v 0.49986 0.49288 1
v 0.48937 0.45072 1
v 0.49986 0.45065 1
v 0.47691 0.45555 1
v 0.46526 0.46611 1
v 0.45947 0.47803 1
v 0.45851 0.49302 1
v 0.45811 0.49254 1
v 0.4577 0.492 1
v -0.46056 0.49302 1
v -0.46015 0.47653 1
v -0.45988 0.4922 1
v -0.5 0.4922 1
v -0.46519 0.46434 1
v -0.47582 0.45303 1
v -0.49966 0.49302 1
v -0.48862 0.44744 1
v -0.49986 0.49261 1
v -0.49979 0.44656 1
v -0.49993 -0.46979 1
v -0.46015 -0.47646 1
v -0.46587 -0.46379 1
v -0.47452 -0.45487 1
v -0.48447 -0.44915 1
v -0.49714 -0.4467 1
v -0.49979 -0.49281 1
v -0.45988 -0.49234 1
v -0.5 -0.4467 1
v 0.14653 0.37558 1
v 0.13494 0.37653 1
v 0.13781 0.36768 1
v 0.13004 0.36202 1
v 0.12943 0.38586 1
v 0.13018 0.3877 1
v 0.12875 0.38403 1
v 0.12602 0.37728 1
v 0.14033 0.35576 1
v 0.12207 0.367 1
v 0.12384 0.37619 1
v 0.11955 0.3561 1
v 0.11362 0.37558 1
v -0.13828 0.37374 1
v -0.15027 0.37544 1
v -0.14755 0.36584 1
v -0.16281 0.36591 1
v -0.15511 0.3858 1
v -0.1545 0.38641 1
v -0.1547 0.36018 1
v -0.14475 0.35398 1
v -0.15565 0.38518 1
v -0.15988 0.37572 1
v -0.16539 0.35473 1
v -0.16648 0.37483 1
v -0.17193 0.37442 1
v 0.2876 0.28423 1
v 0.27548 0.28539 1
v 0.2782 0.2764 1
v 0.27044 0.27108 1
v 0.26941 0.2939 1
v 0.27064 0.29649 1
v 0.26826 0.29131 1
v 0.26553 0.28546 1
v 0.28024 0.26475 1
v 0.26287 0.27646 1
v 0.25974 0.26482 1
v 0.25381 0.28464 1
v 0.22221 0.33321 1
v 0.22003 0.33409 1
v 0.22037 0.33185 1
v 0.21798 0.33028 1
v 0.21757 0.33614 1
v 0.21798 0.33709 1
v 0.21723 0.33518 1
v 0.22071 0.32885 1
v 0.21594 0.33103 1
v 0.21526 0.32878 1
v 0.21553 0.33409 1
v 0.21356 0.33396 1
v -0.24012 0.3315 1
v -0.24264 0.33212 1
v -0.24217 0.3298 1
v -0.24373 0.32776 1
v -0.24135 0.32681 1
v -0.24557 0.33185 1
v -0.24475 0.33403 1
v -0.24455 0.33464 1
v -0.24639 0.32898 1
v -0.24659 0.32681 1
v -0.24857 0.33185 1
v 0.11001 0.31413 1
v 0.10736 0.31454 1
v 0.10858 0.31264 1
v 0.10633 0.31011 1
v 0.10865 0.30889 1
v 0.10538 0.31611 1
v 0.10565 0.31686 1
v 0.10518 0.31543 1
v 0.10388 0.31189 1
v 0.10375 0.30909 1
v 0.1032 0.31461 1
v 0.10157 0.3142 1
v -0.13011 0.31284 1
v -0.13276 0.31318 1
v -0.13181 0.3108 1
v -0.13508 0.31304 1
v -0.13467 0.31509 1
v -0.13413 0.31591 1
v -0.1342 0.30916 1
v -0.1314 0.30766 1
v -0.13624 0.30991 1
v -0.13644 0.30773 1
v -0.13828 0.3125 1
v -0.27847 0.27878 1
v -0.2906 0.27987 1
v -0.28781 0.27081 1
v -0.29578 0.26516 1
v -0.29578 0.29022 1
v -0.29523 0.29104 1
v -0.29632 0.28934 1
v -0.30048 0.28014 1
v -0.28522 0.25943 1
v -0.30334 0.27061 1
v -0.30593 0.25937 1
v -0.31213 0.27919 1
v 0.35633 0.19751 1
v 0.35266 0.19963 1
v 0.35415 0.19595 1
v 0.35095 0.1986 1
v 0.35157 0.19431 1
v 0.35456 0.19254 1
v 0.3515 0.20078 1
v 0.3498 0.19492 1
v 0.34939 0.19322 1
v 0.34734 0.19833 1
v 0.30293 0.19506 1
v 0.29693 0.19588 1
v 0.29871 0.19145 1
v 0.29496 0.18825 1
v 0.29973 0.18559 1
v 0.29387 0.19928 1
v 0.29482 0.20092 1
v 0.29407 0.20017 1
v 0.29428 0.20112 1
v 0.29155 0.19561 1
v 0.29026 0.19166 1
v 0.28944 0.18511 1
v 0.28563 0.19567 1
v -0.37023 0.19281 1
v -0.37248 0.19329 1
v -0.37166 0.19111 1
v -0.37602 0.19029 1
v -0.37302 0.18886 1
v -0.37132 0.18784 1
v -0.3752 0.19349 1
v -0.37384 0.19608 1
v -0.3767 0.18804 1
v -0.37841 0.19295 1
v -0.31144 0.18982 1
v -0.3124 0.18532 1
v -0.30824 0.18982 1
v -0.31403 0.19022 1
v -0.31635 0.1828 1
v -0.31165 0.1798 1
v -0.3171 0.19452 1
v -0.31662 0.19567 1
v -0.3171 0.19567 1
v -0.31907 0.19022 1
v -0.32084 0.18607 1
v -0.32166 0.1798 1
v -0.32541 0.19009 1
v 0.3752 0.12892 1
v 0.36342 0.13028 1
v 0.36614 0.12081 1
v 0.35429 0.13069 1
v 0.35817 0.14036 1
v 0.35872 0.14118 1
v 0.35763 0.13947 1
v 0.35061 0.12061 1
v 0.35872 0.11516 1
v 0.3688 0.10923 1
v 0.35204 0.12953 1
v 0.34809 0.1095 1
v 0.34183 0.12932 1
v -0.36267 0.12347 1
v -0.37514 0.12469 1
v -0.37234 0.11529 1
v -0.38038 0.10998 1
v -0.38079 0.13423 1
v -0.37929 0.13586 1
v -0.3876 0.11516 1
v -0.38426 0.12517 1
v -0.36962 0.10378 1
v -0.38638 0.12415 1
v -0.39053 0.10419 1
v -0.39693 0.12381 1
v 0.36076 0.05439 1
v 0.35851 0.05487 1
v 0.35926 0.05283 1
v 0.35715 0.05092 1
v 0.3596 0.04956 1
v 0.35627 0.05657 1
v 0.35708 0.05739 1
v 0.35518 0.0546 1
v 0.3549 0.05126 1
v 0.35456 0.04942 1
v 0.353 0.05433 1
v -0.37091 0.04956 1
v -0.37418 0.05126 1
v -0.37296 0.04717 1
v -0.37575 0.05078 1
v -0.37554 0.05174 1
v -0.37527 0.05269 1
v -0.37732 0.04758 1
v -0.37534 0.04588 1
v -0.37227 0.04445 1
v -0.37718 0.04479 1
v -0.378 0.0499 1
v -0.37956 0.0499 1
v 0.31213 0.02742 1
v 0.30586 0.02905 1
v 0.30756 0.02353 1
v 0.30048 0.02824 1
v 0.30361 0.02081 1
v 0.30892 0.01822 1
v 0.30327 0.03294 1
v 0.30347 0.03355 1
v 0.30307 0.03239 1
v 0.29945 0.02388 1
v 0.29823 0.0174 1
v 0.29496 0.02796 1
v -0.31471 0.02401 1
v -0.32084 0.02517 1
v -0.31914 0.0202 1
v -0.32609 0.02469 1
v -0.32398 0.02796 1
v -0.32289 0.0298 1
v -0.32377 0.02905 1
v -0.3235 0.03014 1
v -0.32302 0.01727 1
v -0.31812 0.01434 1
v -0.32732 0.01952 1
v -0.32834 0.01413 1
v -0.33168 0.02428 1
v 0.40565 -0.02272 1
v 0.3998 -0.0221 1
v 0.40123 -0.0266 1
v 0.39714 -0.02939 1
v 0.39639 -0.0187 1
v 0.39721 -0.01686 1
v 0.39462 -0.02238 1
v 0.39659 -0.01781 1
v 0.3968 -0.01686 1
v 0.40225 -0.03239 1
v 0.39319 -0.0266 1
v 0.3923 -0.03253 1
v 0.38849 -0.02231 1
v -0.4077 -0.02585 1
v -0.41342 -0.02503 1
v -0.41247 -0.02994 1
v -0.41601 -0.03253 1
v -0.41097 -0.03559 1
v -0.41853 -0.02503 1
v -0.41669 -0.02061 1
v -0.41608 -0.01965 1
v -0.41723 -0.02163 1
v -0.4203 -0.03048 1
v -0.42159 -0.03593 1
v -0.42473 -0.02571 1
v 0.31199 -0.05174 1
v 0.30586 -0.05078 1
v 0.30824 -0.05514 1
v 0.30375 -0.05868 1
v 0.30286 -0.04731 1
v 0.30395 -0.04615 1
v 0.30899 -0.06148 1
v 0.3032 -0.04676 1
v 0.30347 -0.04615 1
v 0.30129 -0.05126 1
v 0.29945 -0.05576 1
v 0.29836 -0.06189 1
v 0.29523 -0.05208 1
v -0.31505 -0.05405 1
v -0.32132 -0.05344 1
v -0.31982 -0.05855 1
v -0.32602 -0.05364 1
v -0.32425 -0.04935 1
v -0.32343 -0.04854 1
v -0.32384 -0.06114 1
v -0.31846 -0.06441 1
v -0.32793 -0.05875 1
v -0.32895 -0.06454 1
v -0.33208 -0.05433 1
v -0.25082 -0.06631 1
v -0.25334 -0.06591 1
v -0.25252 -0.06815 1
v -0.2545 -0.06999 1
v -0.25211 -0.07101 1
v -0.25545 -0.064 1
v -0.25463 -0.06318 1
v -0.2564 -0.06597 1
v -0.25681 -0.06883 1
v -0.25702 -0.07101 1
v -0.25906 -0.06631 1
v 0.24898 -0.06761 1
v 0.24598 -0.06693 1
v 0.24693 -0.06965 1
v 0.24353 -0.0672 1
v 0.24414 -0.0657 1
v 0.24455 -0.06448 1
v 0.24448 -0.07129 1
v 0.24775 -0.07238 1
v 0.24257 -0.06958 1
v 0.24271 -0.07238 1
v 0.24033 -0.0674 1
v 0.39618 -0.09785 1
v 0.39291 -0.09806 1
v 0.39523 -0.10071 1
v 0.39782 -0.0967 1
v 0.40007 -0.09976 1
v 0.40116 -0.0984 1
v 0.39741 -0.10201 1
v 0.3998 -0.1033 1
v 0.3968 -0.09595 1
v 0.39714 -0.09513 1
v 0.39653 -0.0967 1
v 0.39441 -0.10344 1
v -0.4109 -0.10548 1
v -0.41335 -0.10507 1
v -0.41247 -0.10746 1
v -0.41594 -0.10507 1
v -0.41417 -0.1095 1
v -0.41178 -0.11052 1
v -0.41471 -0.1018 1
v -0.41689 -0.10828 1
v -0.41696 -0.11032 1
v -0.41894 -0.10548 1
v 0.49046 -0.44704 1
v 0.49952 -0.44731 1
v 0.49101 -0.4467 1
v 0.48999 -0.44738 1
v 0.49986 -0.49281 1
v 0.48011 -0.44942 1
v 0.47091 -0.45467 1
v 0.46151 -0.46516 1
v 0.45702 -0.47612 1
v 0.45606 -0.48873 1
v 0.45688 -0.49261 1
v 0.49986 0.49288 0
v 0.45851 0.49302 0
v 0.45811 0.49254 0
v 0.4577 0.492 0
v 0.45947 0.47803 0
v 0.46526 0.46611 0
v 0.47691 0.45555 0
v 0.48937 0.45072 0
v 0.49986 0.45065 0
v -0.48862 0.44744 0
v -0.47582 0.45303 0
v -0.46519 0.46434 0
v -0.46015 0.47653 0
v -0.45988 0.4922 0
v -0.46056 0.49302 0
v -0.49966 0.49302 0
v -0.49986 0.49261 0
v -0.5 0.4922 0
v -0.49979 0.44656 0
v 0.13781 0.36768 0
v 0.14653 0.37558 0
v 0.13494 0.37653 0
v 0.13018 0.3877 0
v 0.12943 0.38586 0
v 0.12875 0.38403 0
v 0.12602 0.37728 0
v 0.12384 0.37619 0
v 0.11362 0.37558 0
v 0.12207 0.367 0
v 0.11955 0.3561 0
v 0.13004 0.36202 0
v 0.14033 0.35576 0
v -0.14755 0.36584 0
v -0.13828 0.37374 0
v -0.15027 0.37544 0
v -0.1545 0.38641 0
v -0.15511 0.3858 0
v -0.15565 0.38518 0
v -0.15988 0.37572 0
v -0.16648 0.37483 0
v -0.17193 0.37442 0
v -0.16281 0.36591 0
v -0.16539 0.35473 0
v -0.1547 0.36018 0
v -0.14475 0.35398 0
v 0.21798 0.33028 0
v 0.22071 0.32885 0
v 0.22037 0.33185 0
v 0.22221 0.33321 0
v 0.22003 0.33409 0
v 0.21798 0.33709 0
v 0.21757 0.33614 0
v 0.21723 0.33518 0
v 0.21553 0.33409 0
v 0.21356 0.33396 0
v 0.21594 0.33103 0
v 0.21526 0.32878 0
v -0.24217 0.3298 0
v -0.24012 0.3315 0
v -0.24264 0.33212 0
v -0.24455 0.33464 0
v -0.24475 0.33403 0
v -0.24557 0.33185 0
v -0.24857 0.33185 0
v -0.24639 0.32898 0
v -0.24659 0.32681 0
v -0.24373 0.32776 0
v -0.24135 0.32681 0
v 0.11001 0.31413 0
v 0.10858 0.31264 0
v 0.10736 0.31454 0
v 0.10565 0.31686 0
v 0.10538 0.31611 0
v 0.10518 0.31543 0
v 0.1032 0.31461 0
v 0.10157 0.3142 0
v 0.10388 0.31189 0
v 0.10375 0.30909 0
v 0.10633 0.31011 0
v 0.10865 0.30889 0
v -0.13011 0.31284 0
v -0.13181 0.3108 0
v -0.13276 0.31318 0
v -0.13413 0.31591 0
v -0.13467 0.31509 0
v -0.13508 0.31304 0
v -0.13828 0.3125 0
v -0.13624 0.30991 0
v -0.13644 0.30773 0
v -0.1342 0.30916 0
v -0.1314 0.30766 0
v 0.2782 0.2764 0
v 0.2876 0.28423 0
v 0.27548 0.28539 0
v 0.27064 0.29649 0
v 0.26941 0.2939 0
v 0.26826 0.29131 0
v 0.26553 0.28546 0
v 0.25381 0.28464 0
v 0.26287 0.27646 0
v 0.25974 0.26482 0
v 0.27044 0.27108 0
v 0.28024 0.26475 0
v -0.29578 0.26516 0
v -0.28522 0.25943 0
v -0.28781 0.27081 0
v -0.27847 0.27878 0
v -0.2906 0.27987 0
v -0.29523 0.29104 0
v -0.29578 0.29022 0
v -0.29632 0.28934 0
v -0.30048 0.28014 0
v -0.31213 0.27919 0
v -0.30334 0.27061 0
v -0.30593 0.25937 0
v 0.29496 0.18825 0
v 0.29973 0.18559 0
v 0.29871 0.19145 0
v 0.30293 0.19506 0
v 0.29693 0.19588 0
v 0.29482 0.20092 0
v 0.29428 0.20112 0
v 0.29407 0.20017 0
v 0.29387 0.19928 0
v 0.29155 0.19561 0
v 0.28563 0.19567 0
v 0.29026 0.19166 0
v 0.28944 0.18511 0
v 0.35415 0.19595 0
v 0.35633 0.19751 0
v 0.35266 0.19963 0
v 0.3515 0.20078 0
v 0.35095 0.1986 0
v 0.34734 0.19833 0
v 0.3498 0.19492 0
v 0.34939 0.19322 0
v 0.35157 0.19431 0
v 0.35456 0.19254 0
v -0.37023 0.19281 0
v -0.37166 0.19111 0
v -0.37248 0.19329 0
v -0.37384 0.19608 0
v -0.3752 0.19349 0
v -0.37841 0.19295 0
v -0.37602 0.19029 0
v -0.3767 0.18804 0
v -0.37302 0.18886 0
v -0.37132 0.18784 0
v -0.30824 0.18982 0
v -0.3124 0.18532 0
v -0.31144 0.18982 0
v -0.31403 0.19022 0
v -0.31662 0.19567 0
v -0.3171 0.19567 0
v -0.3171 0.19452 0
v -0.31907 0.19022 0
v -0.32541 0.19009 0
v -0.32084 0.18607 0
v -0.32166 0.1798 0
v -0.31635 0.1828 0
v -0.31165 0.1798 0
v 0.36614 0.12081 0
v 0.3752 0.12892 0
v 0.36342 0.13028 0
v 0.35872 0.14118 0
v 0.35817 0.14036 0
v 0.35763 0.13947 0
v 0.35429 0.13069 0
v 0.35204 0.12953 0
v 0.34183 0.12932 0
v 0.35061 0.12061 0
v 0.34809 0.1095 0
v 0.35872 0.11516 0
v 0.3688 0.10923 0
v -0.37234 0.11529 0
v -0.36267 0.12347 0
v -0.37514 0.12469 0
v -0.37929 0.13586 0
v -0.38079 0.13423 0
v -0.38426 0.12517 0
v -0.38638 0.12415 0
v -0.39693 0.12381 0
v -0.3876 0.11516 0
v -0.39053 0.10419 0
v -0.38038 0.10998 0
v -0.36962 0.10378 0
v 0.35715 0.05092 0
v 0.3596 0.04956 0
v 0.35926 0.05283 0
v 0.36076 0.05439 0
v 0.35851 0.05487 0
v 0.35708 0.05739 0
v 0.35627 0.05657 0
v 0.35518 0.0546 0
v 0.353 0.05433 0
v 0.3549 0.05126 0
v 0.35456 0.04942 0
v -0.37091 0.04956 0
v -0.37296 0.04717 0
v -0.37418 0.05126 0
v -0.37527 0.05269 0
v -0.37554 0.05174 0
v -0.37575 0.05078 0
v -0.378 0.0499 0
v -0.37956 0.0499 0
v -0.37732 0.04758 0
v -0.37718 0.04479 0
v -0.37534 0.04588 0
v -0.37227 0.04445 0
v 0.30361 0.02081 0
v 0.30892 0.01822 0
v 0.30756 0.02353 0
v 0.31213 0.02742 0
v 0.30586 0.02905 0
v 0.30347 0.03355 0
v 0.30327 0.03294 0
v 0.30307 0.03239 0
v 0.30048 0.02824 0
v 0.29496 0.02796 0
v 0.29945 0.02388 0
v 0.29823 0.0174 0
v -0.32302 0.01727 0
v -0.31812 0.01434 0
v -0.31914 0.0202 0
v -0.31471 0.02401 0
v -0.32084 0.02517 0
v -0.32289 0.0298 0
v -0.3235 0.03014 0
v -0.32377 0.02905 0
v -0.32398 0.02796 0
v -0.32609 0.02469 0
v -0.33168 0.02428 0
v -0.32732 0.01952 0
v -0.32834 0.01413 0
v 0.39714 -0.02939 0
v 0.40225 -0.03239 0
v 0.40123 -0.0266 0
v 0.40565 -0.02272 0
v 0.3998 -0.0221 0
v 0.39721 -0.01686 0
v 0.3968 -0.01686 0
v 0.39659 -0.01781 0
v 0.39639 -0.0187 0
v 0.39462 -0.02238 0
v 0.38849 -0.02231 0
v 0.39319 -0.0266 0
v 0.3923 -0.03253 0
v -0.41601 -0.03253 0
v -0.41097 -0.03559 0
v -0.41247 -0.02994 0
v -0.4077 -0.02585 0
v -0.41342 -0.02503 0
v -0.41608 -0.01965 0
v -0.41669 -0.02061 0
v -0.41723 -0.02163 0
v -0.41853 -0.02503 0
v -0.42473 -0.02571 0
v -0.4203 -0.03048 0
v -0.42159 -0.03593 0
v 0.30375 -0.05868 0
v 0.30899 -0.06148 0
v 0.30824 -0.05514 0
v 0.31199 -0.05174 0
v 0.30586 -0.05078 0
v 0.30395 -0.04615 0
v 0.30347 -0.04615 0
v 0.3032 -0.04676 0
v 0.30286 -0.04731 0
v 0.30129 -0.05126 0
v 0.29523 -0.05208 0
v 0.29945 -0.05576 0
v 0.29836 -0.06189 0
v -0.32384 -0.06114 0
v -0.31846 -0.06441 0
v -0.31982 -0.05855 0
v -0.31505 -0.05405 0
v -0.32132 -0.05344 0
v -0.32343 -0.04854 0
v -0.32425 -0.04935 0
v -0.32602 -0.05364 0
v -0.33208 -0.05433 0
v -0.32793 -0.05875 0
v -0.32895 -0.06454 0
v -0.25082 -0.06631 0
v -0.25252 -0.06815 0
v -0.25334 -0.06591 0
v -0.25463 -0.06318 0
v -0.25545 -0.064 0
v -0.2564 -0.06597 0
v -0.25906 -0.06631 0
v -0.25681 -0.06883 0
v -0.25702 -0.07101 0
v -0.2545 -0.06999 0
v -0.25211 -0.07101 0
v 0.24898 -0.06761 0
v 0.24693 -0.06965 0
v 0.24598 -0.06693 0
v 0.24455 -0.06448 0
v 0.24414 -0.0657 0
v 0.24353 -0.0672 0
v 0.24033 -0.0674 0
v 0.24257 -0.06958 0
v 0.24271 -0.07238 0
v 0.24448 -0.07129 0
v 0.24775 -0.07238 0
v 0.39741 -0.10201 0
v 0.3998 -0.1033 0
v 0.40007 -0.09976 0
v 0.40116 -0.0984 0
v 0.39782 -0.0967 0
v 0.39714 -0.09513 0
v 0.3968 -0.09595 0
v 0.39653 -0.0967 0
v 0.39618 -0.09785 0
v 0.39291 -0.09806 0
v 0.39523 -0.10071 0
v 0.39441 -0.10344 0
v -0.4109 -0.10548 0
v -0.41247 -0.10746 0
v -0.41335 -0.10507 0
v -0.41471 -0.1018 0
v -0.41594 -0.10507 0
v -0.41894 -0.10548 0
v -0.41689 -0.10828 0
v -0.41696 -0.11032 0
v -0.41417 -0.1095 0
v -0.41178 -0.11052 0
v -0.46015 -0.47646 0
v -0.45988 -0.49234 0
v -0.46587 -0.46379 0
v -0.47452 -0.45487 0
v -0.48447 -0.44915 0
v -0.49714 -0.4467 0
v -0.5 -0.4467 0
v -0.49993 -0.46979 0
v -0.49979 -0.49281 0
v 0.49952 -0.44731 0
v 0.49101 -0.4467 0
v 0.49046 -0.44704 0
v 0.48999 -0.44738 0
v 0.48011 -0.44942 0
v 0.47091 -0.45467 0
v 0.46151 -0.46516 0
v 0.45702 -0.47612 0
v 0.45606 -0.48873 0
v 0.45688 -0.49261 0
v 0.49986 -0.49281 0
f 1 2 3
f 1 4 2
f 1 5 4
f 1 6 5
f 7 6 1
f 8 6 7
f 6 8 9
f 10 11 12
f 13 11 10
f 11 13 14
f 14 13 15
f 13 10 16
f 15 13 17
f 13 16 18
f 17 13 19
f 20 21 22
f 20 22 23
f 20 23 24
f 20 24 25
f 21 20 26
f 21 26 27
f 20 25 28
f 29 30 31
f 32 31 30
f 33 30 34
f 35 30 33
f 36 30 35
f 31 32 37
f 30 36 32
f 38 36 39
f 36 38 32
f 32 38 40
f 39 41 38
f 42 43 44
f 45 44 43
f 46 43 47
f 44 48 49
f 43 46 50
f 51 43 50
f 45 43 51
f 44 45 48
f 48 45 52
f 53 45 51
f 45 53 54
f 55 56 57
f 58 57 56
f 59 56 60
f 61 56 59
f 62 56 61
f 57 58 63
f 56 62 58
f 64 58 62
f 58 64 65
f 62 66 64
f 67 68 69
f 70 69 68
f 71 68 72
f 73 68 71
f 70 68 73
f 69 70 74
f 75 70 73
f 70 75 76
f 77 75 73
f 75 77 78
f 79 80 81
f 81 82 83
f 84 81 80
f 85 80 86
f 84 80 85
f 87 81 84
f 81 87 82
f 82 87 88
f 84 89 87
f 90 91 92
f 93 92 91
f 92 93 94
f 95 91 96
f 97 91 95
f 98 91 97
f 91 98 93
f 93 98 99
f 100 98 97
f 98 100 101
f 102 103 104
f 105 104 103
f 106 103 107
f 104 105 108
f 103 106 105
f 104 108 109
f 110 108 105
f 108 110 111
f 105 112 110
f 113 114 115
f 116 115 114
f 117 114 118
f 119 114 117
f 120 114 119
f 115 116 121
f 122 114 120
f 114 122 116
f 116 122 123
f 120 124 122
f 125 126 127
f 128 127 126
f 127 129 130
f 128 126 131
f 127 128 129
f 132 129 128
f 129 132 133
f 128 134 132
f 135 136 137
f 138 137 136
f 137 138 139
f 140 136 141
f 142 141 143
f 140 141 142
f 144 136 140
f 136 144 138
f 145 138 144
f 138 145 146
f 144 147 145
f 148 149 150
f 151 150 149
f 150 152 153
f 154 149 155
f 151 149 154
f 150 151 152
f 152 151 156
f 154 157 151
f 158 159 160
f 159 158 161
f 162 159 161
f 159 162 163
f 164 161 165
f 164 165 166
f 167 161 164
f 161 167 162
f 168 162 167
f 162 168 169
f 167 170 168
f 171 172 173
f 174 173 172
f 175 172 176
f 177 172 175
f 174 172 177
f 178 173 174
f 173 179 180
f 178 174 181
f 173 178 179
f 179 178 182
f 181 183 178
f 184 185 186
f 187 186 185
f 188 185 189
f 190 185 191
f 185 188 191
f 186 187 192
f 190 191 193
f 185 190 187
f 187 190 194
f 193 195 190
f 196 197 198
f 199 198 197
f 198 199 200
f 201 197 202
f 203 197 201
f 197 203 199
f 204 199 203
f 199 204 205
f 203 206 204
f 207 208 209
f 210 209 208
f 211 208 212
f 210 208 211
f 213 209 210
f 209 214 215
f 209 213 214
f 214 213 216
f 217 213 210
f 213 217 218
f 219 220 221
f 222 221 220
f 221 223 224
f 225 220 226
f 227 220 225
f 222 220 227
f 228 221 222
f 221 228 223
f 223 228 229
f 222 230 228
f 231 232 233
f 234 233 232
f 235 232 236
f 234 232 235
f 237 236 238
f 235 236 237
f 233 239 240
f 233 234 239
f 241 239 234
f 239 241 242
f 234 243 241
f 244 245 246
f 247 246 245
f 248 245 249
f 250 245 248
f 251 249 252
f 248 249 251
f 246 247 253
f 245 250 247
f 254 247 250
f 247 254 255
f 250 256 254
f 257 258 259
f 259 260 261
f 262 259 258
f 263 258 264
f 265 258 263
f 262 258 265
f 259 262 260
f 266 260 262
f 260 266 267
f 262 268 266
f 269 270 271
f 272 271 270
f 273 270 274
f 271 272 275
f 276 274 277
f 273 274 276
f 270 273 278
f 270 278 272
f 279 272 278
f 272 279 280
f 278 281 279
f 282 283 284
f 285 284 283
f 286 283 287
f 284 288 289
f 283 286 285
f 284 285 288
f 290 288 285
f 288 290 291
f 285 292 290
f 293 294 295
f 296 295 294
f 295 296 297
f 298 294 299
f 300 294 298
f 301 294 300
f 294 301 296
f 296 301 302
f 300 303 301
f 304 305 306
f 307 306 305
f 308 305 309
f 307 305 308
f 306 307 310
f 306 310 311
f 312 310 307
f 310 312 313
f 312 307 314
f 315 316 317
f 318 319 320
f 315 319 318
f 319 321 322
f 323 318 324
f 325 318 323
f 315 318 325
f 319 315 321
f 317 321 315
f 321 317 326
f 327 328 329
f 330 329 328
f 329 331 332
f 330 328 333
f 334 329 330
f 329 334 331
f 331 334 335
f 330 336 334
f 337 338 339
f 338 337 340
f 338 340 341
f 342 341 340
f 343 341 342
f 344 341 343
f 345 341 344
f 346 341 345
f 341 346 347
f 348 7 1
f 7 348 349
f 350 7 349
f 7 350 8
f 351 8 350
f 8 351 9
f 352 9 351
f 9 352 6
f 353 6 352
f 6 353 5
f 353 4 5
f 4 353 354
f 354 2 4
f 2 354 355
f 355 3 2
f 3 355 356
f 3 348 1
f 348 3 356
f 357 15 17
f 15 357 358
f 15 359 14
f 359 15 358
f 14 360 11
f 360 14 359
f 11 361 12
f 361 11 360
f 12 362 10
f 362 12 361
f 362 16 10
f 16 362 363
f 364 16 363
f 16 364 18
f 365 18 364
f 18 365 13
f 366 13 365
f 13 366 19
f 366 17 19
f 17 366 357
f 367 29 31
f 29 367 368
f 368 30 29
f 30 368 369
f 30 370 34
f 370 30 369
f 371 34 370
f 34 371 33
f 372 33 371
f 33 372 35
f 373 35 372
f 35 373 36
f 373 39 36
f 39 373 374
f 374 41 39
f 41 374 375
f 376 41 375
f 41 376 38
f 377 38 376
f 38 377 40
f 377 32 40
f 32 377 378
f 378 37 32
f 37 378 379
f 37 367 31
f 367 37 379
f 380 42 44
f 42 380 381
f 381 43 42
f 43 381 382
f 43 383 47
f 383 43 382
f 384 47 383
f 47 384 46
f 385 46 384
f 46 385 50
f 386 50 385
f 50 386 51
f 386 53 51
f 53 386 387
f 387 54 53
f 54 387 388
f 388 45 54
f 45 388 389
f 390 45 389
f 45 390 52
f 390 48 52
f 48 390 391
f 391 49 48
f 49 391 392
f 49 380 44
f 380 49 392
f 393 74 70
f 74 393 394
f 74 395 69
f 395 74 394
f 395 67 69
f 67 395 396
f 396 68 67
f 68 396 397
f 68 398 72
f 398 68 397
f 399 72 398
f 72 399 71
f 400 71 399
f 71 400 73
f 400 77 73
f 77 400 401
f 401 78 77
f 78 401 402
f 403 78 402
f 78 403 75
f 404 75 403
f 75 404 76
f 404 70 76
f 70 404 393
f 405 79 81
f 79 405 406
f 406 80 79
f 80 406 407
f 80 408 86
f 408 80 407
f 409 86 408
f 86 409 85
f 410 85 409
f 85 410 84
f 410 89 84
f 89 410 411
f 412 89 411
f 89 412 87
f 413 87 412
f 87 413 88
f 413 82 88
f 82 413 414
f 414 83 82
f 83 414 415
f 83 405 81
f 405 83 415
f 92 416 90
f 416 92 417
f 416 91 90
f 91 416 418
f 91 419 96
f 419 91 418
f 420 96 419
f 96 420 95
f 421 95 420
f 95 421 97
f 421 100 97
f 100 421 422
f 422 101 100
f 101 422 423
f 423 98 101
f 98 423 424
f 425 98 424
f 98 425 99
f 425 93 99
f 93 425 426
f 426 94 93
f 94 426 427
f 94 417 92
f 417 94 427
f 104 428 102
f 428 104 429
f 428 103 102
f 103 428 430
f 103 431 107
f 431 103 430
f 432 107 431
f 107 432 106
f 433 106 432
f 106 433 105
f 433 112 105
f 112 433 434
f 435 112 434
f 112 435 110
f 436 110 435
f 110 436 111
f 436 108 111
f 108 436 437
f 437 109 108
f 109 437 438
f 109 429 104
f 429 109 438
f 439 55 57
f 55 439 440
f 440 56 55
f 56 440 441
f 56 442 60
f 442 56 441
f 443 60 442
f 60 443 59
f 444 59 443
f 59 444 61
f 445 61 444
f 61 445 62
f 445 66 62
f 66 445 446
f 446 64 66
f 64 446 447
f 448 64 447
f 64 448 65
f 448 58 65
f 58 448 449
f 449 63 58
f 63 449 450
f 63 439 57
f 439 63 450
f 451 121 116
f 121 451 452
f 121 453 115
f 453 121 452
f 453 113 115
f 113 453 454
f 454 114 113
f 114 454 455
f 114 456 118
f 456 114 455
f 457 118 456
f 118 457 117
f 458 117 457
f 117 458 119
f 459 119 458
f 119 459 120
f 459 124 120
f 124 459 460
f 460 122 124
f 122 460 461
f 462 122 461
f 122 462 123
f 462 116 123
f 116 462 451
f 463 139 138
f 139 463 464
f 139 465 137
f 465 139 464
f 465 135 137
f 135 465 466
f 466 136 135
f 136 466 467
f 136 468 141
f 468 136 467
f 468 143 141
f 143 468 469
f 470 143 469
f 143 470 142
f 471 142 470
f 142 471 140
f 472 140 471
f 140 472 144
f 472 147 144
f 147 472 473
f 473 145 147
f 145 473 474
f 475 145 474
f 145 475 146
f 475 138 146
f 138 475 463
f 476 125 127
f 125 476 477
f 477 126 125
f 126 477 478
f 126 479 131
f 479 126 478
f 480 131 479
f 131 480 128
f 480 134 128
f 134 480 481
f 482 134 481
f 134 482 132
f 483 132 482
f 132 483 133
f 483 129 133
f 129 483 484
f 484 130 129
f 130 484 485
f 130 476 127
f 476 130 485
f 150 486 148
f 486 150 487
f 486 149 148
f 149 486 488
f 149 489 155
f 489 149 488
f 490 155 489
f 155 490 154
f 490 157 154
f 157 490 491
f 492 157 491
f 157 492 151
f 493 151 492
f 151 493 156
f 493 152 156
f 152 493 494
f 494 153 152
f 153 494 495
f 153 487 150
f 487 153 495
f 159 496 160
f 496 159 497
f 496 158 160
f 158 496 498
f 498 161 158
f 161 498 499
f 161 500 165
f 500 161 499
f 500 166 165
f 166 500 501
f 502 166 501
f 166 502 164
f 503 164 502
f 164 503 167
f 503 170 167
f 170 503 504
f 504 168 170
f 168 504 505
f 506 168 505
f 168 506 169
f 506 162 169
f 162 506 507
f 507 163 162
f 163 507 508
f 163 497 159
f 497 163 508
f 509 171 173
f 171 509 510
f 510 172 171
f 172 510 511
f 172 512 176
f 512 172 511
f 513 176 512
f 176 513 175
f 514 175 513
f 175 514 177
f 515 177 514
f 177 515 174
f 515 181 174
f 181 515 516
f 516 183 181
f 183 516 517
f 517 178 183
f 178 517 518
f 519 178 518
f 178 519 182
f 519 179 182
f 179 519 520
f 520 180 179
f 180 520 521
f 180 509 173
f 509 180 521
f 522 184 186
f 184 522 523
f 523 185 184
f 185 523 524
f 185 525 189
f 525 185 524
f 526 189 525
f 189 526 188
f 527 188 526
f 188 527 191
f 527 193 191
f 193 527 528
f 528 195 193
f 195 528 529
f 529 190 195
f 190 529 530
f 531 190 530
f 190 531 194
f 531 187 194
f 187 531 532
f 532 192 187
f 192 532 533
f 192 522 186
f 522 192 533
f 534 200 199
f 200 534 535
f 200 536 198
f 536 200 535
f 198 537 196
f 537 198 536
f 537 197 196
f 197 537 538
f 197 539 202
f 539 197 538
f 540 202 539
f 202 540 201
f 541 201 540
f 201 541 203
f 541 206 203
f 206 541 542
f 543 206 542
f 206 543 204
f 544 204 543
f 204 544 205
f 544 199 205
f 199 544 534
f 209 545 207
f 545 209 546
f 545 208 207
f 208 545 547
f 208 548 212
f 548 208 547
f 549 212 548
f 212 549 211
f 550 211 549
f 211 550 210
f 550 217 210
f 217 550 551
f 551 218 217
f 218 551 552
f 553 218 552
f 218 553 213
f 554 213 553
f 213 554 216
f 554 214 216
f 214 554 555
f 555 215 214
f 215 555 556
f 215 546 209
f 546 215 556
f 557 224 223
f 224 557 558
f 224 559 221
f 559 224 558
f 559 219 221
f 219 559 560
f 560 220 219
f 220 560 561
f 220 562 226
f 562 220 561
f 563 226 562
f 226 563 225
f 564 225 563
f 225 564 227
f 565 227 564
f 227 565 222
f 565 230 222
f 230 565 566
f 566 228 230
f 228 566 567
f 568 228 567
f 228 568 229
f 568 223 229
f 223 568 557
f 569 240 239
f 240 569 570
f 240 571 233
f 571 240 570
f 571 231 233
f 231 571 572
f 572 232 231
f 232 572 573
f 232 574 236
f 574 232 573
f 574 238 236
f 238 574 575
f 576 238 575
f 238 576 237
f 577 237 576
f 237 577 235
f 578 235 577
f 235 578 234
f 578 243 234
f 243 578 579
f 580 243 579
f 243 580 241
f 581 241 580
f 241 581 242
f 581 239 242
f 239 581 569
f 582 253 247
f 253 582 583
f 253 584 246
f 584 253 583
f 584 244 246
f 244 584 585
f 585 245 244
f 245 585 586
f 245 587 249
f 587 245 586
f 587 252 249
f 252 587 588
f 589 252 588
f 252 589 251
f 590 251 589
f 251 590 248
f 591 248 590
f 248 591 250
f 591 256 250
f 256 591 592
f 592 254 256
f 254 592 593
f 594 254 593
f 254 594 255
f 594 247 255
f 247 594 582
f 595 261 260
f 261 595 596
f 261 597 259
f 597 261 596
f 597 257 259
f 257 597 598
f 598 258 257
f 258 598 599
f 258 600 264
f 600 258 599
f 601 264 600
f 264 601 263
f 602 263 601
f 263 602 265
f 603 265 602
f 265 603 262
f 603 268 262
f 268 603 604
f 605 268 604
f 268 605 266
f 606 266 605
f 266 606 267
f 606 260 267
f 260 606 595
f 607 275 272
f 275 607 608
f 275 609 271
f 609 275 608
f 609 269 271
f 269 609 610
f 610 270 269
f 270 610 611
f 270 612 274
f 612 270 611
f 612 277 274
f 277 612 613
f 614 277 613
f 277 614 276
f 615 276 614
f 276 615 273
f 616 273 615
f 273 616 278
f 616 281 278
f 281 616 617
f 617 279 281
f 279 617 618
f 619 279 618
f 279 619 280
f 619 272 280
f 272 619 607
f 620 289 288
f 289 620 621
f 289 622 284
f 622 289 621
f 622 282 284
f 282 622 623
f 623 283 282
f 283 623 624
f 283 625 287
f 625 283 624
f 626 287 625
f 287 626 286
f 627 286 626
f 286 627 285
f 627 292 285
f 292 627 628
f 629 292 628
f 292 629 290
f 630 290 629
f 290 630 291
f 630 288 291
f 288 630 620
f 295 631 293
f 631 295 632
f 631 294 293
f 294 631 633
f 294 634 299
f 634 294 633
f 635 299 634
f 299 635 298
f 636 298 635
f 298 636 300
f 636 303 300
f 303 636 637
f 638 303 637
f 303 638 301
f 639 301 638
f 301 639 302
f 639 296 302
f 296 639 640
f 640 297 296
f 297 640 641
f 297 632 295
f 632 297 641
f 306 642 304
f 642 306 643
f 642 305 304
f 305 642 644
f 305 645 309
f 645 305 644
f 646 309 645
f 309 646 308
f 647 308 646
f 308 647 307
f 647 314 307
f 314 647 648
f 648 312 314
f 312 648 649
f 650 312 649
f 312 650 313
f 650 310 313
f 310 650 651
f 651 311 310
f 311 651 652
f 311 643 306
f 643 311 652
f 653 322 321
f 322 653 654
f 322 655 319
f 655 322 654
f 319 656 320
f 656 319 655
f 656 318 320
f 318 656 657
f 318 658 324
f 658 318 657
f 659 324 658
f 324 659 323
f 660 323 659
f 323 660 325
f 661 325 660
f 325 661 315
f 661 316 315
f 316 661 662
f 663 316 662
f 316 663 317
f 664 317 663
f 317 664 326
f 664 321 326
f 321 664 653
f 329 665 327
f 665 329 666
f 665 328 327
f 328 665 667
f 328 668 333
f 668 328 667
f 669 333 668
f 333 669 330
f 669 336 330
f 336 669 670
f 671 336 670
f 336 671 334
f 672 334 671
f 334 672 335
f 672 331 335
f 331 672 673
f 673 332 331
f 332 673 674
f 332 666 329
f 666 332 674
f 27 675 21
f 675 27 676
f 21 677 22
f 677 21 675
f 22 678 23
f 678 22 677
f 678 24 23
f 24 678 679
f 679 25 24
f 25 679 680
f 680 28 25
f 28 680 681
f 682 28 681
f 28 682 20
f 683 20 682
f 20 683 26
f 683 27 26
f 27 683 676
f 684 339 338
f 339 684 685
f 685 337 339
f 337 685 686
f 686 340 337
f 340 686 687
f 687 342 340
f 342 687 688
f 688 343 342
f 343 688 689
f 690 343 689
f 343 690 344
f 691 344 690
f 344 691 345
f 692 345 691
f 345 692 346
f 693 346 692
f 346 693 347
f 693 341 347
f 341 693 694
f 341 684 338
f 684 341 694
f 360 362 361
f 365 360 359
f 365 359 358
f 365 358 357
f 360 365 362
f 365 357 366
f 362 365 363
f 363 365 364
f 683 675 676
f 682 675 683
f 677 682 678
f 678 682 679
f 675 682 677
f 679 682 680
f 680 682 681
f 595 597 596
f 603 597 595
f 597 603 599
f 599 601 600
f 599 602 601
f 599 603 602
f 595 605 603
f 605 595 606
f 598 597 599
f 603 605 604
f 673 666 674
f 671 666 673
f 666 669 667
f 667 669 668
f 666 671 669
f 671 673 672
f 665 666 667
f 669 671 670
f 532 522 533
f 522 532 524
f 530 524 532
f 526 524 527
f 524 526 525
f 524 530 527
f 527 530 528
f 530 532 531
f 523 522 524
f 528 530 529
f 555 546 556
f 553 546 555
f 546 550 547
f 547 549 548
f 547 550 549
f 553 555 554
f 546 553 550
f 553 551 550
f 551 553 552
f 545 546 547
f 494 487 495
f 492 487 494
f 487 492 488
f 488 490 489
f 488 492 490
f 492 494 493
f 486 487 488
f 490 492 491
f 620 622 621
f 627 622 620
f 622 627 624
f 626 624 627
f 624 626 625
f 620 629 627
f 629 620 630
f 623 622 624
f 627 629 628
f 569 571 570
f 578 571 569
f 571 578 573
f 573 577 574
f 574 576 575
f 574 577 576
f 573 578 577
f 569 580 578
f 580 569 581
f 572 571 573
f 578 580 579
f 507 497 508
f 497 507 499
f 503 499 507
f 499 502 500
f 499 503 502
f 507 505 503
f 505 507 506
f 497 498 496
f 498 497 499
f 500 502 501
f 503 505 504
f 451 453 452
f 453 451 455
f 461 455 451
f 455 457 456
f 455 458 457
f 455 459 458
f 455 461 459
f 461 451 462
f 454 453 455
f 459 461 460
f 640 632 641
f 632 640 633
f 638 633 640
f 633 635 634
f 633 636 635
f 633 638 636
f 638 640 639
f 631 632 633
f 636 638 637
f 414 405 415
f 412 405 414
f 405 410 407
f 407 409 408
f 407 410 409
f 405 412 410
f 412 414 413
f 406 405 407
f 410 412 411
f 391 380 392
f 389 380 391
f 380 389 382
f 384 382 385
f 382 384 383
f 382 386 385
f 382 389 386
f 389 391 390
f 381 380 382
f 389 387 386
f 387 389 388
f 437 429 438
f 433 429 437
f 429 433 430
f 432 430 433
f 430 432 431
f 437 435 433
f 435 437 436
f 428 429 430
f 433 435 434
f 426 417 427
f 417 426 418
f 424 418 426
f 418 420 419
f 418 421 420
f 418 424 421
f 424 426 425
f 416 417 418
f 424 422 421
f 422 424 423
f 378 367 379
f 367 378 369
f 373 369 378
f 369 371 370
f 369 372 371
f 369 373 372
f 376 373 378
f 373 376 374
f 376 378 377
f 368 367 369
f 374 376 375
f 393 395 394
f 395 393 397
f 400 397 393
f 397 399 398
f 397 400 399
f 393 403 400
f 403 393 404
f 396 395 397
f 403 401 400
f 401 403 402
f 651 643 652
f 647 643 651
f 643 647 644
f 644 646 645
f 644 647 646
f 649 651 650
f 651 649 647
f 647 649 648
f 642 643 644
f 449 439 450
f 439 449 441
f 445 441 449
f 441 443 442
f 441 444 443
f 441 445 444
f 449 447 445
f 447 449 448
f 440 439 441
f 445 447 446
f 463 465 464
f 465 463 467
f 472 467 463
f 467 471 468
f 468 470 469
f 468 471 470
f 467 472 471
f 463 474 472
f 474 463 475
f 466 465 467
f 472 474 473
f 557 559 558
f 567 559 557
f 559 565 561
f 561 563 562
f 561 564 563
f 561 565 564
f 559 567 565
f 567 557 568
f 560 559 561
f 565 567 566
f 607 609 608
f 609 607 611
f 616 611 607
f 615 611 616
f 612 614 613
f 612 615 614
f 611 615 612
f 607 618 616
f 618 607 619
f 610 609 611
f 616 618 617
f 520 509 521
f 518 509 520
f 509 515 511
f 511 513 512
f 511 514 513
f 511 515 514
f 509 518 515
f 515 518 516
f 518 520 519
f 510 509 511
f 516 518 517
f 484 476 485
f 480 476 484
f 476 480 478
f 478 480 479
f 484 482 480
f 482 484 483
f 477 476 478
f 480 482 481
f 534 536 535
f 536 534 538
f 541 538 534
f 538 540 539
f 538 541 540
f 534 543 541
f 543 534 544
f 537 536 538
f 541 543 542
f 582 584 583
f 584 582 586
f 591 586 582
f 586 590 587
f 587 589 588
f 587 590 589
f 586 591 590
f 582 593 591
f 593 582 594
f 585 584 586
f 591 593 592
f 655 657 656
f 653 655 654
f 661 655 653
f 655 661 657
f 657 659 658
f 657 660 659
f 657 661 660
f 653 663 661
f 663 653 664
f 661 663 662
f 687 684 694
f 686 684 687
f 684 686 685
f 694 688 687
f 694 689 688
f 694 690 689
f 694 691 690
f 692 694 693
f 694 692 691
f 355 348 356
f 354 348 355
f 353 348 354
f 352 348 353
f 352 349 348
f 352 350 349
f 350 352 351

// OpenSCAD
module HighLonesomeStars_1()
{
 /* Generated by trace2scad version 20150415
    http://aggregate.org/MAKE/TRACE2SCAD/
    Optimized model has 358/1726 original points
 */
 color([0.5, 0.5, 0.5])
 assign(minx=2390) /* polygon minx=2390 */
 assign(miny=2715) /* polygon miny=2715 */
 assign(maxx=17070) /* polygon maxx=17070 */
 assign(maxy=17190) /* polygon maxy=17190 */
 assign(dx=maxx-minx)
 assign(dy=maxy-miny)
 assign(maxd=((dx>dy)?dx:dy))
 scale([1/maxd, 1/maxd, 1])
 translate([-minx-dx/2, -miny-dy/2, 0])
 linear_extrude(height=1, convexity=358)
 union() {
  union() {
   polygon([[2392,17184],[2390,17178],[2393,16508],[2557,16521],[2745,16603],[2901,16769],[2975,16948],[2979,17178],[2969,17190],[2395,17190]], convexity=6);
   polygon([[16455,17183],[16449,17175],[16475,16970],[16560,16795],[16731,16640],[16914,16569],[17068,16568],[17068,17188],[16461,17190]], convexity=6);
   polygon([[11630,15617],[11620,15590],[11580,15491],[11548,15475],[11398,15466],[11522,15340],[11485,15180],[11639,15267],[11790,15175],[11753,15350],[11881,15466],[11711,15480],[11641,15644]], convexity=10);
   polygon([[7453,15616],[7445,15607],[7383,15468],[7286,15455],[7206,15449],[7340,15324],[7302,15160],[7459,15240],[7605,15149],[7564,15323],[7700,15439],[7524,15464],[7462,15625]], convexity=10);
   polygon([[12924,14887],[12919,14873],[12894,14857],[12865,14855],[12900,14812],[12890,14779],[12930,14801],[12970,14780],[12965,14824],[12992,14844],[12960,14857],[12930,14901]], convexity=10);
   polygon([[6137,14856],[6134,14848],[6125,14824],[6081,14824],[6113,14782],[6110,14750],[6152,14764],[6187,14750],[6175,14794],[6205,14819],[6168,14828],[6140,14865]], convexity=11);
   polygon([[11277,14593],[11274,14583],[11245,14571],[11221,14565],[11255,14531],[11253,14490],[11291,14505],[11325,14487],[11324,14542],[11345,14564],[11306,14570],[11281,14604]], convexity=10);
   polygon([[7757,14584],[7753,14578],[7747,14548],[7700,14540],[7730,14502],[7727,14470],[7760,14491],[7801,14469],[7795,14515],[7820,14545],[7781,14550],[7761,14590]], convexity=10);
   polygon([[13685,14267],[13668,14229],[13628,14143],[13456,14131],[13589,14011],[13543,13840],[13700,13932],[13844,13839],[13814,14010],[13952,14125],[13774,14142],[13703,14305]], convexity=10);
   polygon([[5388,14213],[5380,14200],[5319,14065],[5148,14051],[5277,13925],[5239,13760],[5388,13845],[5543,13761],[5505,13928],[5642,14045],[5464,14061],[5396,14225]], convexity=10);
   polygon([[14047,12891],[14044,12878],[14010,12824],[13923,12825],[13991,12766],[13979,12670],[14060,12716],[14130,12677],[14115,12763],[14177,12816],[14089,12828],[14058,12902],[14050,12905]], convexity=11);
   polygon([[14886,12884],[14882,12868],[14829,12864],[14865,12814],[14859,12789],[14891,12805],[14935,12779],[14929,12829],[14961,12852],[14907,12883],[14890,12900]], convexity=10);
   polygon([[4232,12812],[4222,12793],[4175,12785],[4210,12746],[4200,12713],[4254,12725],[4279,12710],[4274,12758],[4295,12783],[4262,12790],[4242,12831]], convexity=10);
   polygon([[5075,12816],[5075,12808],[5046,12745],[4953,12743],[5020,12684],[5008,12592],[5086,12636],[5155,12592],[5144,12673],[5205,12739],[5158,12739],[5120,12745],[5082,12825],[5075,12825]], convexity=11);
   polygon([[14988,12013],[14980,12000],[14931,11871],[14898,11854],[14748,11851],[14877,11723],[14840,11560],[14996,11643],[15144,11556],[15105,11726],[15238,11845],[15065,11865],[14996,12025]], convexity=10);
   polygon([[4151,11935],[4140,11923],[4089,11790],[4058,11775],[3903,11770],[4040,11643],[3997,11482],[4146,11567],[4304,11476],[4264,11645],[4406,11765],[4223,11783],[4162,11947]], convexity=10);
   polygon([[14966,10789],[14960,10783],[14944,10754],[14912,10750],[14940,10705],[14935,10678],[14973,10700],[15009,10680],[15004,10728],[15026,10751],[14993,10758],[14972,10795]], convexity=10);
   polygon([[4217,10712],[4214,10698],[4181,10685],[4158,10685],[4191,10651],[4193,10610],[4220,10626],[4265,10605],[4255,10645],[4285,10680],[4237,10705],[4221,10726]], convexity=10);
   polygon([[14182,10436],[14179,10428],[14141,10367],[14060,10363],[14126,10303],[14108,10208],[14187,10258],[14265,10220],[14245,10298],[14312,10355],[14220,10379],[14185,10445]], convexity=10);
   polygon([[4977,10379],[4974,10363],[4943,10315],[4861,10309],[4925,10239],[4910,10160],[4988,10206],[5060,10163],[5045,10249],[5110,10305],[5020,10322],[4990,10390],[4981,10395]], convexity=10);
   polygon([[15552,9691],[15549,9678],[15523,9624],[15433,9625],[15502,9562],[15489,9475],[15560,9521],[15635,9477],[15620,9562],[15685,9619],[15599,9628],[15561,9705],[15555,9705]], convexity=11);
   polygon([[3613,9650],[3605,9635],[3586,9585],[3495,9575],[3560,9505],[3541,9425],[3623,9475],[3697,9430],[3675,9513],[3745,9573],[3661,9585],[3622,9664]], convexity=10);
   polygon([[14181,9266],[14176,9258],[14153,9200],[14064,9188],[14126,9134],[14110,9044],[14189,9091],[14266,9050],[14255,9143],[14310,9193],[14220,9207],[14192,9275],[14185,9275]], convexity=10);
   polygon([[4976,9234],[4970,9228],[4944,9165],[4855,9155],[4916,9090],[4901,9005],[4976,9055],[5055,9007],[5035,9093],[5105,9159],[5013,9168],[4982,9240]], convexity=10);
   polygon([[5986,9019],[5980,9013],[5966,8984],[5927,8979],[5960,8942],[5957,8910],[5994,8925],[6029,8910],[6023,8952],[6048,8979],[6011,8985],[5992,9025]], convexity=10);
   polygon([[13317,8997],[13314,8988],[13305,8966],[13258,8963],[13291,8931],[13293,8890],[13319,8906],[13367,8890],[13355,8930],[13385,8960],[13341,8970],[13320,9006]], convexity=9);
   polygon([[15555,8544],[15551,8533],[15546,8516],[15498,8513],[15532,8474],[15520,8434],[15564,8455],[15599,8436],[15603,8488],[15619,8508],[15570,8533],[15560,8556]], convexity=9);
   polygon([[3633,8434],[3624,8410],[3580,8404],[3610,8363],[3609,8333],[3650,8345],[3685,8330],[3675,8375],[3698,8404],[3662,8410],[3642,8458]], convexity=10);
   polygon([[2391,3056],[2393,2718],[2979,2725],[2975,2958],[2891,3144],[2764,3275],[2618,3359],[2432,3395],[2390,3395]], convexity=5);
   polygon([[16930,3390],[16923,3385],[16778,3355],[16643,3278],[16505,3124],[16439,2963],[16425,2778],[16437,2721],[17068,2718],[17063,3386],[16938,3395]], convexity=5);
  }
 }
}

module HighLonesomeStars()
{
 /* all layers combined, scaled to within a 1mm cube */
 scale([1, 1, 1/1])
 difference() {
  union() {
   scale([1,1,2]) translate([0,0,-0.5]) HighLonesomeStars_1();
  }
  translate([0,0,-2]) cube([2,2,4],center=true);
 }
}
HighLonesomeStars();
